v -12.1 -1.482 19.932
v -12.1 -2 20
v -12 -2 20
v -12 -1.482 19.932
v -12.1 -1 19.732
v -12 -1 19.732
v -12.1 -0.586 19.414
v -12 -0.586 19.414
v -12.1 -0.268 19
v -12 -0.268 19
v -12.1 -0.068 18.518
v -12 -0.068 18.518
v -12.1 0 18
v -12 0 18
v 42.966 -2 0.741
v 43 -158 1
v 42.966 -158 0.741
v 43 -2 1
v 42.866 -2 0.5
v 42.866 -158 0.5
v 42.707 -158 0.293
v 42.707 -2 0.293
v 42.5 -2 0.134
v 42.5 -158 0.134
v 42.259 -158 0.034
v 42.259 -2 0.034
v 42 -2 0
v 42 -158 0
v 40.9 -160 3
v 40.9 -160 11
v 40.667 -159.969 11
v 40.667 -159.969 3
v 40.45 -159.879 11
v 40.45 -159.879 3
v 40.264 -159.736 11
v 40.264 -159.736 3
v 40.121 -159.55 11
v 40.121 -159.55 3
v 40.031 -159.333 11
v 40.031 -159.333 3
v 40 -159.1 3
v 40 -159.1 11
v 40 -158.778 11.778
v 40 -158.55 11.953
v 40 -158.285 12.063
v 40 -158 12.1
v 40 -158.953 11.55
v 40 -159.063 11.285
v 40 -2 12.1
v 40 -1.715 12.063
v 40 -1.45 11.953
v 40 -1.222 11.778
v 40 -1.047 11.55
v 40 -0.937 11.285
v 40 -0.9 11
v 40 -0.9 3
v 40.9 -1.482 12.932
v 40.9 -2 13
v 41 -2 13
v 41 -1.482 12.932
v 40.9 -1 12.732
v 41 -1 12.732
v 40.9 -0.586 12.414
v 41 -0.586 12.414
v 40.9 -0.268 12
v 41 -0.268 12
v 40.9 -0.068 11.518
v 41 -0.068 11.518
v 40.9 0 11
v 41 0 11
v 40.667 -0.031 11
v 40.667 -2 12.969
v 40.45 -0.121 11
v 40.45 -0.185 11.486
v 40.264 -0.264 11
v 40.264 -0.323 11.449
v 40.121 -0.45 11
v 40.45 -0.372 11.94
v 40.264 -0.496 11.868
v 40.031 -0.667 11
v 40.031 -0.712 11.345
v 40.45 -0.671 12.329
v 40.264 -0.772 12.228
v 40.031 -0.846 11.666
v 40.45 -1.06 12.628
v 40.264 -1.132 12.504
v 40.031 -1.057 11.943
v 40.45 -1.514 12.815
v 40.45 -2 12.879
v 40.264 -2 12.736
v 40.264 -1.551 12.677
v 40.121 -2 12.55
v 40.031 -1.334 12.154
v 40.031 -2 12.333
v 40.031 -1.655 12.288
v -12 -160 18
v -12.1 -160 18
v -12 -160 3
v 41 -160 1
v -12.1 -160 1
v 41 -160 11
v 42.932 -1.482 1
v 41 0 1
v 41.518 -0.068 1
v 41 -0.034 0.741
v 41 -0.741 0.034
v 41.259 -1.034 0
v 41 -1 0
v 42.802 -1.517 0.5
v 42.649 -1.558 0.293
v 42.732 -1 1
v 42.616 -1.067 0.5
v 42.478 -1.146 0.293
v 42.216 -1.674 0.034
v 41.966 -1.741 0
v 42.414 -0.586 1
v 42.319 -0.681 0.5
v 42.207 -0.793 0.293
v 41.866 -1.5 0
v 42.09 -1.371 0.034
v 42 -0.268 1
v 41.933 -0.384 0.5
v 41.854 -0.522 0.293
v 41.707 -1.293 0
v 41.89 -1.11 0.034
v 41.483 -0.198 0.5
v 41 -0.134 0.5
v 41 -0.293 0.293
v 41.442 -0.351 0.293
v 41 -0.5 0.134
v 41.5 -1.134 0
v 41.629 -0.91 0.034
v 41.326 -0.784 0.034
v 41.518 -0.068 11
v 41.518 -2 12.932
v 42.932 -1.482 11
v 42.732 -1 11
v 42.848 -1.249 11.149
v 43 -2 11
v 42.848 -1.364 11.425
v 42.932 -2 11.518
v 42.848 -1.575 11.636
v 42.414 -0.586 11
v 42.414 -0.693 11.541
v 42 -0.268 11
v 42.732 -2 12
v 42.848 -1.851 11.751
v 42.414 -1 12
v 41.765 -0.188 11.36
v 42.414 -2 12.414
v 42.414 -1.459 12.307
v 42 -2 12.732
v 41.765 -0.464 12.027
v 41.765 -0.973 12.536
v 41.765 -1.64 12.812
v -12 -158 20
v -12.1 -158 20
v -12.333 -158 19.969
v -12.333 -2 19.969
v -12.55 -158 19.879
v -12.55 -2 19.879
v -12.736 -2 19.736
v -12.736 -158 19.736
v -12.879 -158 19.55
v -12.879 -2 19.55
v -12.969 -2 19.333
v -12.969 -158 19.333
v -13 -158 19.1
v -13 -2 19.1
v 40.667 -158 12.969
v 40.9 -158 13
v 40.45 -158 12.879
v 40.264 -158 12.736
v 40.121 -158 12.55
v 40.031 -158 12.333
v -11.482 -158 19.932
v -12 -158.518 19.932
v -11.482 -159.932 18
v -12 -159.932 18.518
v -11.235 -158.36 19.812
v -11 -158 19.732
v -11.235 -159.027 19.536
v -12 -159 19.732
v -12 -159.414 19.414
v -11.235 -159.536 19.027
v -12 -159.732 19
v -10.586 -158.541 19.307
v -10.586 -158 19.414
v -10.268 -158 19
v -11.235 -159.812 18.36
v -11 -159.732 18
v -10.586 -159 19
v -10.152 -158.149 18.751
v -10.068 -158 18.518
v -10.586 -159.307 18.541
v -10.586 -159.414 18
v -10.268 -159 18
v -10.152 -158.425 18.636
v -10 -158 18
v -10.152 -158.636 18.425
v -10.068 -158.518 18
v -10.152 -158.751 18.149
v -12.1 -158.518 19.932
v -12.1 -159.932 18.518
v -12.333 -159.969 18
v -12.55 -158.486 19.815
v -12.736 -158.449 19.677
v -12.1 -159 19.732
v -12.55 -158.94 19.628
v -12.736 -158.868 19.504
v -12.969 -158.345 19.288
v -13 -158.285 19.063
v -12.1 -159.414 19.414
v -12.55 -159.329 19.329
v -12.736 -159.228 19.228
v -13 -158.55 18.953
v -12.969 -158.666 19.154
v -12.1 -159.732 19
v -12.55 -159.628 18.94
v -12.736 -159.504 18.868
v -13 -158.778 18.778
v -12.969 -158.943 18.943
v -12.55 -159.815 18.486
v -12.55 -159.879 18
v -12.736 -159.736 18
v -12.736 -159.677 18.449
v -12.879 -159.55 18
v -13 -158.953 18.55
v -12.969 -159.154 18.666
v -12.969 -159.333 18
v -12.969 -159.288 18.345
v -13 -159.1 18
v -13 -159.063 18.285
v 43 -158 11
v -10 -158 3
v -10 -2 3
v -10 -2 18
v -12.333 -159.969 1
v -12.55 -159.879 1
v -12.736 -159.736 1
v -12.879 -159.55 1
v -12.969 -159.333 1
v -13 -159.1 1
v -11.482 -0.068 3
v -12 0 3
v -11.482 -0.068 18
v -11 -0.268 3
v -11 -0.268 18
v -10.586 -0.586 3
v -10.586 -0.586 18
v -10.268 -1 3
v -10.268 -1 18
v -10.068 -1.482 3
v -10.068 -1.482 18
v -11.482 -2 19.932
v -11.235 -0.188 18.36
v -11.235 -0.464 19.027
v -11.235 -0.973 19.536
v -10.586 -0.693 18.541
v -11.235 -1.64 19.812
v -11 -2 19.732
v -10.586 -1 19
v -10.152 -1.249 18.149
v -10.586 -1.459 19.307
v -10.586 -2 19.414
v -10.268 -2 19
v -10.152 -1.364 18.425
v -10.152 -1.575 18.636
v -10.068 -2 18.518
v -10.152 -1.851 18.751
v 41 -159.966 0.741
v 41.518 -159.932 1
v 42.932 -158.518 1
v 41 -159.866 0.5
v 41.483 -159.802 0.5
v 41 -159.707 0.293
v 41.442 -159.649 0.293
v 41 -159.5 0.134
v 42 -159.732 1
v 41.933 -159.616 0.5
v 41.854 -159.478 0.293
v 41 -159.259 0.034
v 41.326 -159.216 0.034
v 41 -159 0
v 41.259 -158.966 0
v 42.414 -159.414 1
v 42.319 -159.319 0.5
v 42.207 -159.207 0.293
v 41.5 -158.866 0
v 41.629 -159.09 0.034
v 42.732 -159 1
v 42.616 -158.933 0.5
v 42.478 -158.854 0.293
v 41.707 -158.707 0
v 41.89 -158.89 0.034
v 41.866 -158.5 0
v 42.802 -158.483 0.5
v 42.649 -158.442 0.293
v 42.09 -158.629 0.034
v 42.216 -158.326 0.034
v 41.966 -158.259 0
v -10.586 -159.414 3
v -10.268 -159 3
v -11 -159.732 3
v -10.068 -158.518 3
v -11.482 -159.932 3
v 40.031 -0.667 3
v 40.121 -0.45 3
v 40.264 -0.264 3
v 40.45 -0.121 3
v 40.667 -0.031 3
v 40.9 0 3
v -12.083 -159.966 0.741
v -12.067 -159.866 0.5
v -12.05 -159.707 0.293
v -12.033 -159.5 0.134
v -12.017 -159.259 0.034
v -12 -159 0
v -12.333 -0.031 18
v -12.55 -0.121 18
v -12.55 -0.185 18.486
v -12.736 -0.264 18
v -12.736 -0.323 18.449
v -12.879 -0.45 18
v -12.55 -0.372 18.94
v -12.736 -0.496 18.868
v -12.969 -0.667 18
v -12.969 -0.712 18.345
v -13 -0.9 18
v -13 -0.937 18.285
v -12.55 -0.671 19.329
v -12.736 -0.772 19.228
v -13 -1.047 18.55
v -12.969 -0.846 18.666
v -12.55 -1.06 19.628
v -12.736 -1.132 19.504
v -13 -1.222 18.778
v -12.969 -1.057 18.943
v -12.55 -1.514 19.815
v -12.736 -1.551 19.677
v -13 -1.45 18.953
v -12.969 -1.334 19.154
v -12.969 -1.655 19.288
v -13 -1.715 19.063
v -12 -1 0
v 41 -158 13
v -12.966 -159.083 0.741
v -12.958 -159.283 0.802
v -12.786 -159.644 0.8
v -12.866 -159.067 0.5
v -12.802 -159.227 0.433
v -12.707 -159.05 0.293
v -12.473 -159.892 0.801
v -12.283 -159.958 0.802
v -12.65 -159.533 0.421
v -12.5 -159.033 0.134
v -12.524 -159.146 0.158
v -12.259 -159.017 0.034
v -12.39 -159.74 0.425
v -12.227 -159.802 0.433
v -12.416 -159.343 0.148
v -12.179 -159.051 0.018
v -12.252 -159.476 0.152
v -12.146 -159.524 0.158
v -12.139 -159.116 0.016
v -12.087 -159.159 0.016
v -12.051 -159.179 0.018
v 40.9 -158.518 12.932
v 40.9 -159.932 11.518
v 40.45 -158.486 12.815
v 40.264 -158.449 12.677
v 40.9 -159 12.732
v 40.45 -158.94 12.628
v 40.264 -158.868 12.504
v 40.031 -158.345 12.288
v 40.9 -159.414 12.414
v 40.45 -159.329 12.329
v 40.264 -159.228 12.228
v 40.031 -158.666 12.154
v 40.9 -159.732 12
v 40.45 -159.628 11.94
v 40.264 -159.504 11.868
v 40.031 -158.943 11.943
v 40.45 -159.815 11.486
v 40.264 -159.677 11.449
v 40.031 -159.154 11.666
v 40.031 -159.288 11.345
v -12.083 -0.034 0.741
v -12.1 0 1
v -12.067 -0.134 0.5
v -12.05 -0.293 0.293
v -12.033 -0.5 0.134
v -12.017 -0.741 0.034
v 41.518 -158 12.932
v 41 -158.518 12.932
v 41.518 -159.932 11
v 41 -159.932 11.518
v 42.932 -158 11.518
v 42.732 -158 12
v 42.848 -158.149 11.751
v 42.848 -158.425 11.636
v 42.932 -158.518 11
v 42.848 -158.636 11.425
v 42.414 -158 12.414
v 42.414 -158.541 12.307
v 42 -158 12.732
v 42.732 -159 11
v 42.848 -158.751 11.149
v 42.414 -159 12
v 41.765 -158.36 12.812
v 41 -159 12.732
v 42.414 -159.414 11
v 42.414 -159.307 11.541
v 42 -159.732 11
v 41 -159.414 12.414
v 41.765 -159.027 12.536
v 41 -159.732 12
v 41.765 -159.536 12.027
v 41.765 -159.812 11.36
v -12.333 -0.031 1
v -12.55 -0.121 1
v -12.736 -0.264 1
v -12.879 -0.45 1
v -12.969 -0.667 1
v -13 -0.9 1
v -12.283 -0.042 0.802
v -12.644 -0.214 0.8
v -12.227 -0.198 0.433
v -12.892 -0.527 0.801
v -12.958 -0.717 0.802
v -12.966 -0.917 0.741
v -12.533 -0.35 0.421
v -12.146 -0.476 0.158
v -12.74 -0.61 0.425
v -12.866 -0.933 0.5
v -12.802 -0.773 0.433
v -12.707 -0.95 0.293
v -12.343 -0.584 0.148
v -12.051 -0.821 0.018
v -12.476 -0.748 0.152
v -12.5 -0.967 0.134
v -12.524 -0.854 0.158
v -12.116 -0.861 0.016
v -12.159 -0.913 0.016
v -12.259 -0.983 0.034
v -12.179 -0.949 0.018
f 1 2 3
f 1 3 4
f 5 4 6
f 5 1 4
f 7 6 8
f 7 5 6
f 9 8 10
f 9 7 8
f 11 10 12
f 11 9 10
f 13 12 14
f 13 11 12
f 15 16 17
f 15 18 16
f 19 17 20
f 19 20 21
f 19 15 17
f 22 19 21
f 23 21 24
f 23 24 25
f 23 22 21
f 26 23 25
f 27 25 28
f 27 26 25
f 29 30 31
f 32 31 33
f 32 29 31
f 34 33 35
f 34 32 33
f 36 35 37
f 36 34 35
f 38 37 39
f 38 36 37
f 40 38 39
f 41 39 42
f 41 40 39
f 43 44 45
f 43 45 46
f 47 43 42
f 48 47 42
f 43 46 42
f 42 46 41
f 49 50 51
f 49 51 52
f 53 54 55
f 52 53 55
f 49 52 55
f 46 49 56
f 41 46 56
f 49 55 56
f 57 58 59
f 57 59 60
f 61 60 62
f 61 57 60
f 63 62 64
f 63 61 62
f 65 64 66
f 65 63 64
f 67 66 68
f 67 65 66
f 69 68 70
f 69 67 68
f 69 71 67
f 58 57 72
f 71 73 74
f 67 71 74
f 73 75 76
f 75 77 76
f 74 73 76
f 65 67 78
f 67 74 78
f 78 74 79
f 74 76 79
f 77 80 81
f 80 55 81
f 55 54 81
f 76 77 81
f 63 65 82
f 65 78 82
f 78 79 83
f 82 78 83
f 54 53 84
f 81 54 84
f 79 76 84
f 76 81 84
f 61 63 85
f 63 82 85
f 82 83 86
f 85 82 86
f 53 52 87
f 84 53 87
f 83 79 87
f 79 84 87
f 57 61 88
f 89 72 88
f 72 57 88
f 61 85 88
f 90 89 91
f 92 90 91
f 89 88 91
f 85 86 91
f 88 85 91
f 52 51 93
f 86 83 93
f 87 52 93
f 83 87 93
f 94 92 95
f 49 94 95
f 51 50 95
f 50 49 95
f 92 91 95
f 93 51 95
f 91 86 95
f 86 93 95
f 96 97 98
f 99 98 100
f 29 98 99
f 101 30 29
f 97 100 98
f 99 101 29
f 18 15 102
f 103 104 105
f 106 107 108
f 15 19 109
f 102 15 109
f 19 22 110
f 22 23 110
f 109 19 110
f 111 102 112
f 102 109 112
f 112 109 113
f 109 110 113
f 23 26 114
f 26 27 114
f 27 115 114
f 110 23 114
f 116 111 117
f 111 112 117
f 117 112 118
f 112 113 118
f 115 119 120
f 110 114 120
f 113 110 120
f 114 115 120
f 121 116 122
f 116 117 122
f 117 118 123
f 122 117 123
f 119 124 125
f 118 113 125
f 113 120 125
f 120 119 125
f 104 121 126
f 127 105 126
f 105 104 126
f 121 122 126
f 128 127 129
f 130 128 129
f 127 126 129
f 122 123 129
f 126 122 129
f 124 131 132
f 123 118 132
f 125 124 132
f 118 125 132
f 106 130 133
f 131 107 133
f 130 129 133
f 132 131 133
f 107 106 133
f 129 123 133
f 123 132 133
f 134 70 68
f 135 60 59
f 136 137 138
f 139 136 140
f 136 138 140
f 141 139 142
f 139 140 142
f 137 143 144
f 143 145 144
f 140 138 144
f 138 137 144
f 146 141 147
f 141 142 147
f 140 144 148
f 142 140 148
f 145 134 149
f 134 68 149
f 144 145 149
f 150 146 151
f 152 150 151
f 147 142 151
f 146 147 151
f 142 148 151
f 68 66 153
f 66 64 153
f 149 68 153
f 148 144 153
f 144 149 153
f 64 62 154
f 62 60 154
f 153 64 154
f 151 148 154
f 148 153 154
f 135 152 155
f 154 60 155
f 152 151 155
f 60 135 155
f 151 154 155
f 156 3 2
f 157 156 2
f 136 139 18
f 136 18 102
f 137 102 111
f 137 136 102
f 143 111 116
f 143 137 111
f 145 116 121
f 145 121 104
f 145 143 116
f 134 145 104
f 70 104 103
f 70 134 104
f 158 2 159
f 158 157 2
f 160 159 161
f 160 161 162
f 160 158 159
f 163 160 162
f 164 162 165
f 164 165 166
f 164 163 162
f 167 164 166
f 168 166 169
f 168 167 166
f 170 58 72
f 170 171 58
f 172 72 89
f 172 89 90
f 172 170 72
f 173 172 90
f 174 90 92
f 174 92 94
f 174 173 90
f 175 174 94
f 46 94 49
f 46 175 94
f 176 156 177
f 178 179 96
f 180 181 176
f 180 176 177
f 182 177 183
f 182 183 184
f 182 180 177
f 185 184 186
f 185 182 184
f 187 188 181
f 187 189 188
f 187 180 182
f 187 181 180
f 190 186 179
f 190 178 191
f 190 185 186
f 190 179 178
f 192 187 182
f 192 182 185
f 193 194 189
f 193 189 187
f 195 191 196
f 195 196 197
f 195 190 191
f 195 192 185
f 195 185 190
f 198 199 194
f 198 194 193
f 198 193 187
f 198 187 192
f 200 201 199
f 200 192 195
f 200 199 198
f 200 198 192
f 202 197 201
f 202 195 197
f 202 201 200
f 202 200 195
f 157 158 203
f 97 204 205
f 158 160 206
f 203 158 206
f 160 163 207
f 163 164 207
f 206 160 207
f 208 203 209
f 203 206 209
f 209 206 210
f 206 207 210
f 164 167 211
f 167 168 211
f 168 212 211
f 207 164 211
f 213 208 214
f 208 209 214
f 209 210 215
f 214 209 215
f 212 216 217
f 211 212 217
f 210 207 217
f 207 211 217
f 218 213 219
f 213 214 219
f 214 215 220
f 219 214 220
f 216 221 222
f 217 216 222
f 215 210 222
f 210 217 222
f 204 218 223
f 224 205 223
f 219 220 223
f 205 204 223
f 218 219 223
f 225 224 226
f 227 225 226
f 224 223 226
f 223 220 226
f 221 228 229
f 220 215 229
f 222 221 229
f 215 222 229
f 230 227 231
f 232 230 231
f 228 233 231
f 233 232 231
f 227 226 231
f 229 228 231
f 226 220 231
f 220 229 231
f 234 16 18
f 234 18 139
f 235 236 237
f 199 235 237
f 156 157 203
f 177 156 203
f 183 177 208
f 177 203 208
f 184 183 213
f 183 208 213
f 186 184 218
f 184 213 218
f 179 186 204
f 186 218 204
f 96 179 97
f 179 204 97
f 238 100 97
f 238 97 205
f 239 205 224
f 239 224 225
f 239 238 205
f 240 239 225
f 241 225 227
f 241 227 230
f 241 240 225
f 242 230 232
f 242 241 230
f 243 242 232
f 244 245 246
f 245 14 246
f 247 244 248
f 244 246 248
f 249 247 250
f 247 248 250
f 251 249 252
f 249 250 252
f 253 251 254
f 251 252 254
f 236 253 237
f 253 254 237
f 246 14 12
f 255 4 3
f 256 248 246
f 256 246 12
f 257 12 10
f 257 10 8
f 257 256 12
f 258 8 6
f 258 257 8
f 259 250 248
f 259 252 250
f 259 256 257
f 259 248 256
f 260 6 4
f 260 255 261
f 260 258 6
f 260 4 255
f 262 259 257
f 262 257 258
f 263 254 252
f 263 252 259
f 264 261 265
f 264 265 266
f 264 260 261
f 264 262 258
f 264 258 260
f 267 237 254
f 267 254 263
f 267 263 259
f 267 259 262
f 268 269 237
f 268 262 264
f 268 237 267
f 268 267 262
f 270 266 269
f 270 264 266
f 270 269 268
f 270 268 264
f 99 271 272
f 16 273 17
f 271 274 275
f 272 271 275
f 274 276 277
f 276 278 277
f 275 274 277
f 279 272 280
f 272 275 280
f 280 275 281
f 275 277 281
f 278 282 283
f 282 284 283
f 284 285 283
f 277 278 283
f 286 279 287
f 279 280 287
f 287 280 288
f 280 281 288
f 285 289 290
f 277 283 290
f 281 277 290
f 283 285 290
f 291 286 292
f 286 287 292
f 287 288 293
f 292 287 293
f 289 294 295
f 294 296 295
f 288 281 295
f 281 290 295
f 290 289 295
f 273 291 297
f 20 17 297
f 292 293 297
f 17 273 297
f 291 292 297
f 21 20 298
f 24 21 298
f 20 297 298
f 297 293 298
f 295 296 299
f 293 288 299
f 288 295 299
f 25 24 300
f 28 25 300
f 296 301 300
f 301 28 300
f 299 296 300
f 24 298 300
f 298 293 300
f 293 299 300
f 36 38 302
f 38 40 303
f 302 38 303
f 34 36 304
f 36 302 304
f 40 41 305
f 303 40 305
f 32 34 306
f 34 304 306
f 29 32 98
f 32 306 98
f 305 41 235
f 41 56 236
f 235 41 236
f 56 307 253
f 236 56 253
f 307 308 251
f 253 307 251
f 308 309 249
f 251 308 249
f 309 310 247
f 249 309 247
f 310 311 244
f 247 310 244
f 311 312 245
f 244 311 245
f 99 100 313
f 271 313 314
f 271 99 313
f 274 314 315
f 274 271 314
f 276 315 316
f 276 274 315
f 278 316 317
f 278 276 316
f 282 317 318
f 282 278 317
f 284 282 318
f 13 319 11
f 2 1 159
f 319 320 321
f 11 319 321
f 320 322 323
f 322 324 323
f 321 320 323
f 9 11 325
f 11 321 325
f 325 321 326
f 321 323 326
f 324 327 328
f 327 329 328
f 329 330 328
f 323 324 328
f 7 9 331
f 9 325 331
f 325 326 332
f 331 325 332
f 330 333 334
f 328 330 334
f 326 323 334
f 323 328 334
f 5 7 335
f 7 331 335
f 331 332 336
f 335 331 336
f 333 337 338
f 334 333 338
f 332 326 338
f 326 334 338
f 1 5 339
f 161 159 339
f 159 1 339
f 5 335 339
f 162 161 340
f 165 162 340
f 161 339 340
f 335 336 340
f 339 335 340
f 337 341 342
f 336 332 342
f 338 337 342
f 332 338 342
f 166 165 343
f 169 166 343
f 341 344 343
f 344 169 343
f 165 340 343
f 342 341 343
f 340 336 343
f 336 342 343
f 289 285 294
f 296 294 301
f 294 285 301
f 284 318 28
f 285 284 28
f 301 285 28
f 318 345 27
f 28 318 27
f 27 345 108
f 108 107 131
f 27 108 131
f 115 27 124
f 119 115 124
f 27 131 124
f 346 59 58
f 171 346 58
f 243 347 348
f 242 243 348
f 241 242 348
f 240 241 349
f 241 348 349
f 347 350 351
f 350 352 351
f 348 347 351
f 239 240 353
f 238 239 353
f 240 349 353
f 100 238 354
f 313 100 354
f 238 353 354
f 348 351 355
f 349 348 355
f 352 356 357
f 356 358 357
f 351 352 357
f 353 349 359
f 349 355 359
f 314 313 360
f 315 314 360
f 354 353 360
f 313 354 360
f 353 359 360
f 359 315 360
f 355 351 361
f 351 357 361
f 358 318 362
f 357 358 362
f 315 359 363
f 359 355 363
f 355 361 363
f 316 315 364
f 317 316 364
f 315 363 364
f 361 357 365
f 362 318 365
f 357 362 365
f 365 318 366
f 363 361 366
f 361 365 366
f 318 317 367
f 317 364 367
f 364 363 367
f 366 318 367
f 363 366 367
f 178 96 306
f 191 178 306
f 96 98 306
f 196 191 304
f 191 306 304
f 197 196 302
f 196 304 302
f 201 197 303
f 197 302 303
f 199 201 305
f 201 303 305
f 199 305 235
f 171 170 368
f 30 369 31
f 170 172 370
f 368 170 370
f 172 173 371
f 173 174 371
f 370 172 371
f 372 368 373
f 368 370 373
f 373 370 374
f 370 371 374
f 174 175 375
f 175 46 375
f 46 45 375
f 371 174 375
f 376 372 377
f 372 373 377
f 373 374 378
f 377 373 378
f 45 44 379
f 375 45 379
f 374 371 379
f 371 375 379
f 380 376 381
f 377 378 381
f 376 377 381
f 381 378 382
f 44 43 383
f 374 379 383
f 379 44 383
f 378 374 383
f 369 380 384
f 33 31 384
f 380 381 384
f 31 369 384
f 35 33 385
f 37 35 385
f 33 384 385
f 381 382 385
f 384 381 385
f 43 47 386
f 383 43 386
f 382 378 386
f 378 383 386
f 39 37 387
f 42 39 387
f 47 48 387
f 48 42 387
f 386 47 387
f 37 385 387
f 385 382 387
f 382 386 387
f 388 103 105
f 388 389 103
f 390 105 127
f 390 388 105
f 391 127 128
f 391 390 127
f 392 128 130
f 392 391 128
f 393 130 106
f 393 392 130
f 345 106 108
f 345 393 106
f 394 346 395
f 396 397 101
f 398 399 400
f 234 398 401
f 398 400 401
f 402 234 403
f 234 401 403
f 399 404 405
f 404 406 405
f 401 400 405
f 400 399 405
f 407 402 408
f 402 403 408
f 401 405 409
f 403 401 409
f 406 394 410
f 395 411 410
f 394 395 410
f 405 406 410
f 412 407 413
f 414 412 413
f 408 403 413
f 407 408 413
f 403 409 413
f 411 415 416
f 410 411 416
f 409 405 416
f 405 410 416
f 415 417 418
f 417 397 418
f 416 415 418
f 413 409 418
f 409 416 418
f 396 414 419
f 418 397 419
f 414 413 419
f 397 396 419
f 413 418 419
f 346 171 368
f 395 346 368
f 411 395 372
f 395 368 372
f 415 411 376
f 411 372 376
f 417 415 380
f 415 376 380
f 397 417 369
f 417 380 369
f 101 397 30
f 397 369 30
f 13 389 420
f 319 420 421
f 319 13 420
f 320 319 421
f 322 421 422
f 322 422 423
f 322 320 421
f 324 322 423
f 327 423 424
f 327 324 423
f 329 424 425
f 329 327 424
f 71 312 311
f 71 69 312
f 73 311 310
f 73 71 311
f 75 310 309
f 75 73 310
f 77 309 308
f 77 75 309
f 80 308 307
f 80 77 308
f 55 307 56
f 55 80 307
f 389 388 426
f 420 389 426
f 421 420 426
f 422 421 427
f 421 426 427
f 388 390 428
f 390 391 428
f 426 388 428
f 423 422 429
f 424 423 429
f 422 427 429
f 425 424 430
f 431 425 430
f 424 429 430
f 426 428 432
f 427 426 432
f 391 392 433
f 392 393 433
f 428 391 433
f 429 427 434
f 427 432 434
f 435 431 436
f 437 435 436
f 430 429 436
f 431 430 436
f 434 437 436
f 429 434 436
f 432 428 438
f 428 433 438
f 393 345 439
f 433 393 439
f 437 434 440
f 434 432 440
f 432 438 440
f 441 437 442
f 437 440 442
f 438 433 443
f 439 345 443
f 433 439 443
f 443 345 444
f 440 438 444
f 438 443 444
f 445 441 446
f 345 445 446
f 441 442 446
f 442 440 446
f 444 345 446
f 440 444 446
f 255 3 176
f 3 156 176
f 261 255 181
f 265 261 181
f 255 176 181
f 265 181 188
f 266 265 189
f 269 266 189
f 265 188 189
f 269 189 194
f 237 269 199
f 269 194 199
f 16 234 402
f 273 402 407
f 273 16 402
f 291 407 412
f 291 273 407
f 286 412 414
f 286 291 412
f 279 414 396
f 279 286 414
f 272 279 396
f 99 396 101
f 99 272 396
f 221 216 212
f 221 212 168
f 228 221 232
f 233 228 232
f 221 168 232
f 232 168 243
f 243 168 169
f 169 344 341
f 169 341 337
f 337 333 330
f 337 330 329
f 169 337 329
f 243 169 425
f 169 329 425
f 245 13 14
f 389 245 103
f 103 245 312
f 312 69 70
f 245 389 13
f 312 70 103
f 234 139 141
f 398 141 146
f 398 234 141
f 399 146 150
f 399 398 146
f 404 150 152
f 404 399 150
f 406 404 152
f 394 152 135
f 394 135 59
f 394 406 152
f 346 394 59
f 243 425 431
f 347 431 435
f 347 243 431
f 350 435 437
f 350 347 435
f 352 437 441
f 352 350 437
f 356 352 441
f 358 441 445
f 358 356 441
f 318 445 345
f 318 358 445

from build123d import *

# Parameters (mm, degrees)
PAD_DEPTH   = 160
FILLET_R    = 2
FILLET001_R = 2
FILLET002_R = 0.9
FILLET003_R = 1


with BuildPart() as part:
    # Sketch → Pad (new body)
    with BuildSketch(Plane.XZ):
        Polygon((-13, 20), (-13, 0), (43, 0), (43, 13), (40, 13), (40, 3), (-10, 3), (-10, 20), align=None)
    extrude(amount=PAD_DEPTH)

    # Fillet
    fillet_edges = [part.edges().sort_by_distance(p)[0] for p in [
        (-11.5, -160, 20),
        (41.5, -160, 13),
        (-11.5, 0, 20),
        (41.5, 0, 13),
    ]]
    fillet(fillet_edges, radius=FILLET_R)

    # Fillet001
    fillet001_edges = [part.edges().sort_by_distance(p)[0] for p in [
        (43, -80, 13),
        (-10, -80, 20),
    ]]
    fillet(fillet001_edges, radius=FILLET001_R)

    # Fillet002
    fillet002_edges = [part.edges().sort_by_distance(p)[0] for p in [
        (40, -80, 13),
        (-13, -80, 20),
    ]]
    fillet(fillet002_edges, radius=FILLET002_R)

    # Fillet003
    fillet003_edges = [part.edges().sort_by_distance(p)[0] for p in [
        (14.45, -160, 0),
    ]]
    fillet(fillet003_edges, radius=FILLET003_R)


solid = part.part
